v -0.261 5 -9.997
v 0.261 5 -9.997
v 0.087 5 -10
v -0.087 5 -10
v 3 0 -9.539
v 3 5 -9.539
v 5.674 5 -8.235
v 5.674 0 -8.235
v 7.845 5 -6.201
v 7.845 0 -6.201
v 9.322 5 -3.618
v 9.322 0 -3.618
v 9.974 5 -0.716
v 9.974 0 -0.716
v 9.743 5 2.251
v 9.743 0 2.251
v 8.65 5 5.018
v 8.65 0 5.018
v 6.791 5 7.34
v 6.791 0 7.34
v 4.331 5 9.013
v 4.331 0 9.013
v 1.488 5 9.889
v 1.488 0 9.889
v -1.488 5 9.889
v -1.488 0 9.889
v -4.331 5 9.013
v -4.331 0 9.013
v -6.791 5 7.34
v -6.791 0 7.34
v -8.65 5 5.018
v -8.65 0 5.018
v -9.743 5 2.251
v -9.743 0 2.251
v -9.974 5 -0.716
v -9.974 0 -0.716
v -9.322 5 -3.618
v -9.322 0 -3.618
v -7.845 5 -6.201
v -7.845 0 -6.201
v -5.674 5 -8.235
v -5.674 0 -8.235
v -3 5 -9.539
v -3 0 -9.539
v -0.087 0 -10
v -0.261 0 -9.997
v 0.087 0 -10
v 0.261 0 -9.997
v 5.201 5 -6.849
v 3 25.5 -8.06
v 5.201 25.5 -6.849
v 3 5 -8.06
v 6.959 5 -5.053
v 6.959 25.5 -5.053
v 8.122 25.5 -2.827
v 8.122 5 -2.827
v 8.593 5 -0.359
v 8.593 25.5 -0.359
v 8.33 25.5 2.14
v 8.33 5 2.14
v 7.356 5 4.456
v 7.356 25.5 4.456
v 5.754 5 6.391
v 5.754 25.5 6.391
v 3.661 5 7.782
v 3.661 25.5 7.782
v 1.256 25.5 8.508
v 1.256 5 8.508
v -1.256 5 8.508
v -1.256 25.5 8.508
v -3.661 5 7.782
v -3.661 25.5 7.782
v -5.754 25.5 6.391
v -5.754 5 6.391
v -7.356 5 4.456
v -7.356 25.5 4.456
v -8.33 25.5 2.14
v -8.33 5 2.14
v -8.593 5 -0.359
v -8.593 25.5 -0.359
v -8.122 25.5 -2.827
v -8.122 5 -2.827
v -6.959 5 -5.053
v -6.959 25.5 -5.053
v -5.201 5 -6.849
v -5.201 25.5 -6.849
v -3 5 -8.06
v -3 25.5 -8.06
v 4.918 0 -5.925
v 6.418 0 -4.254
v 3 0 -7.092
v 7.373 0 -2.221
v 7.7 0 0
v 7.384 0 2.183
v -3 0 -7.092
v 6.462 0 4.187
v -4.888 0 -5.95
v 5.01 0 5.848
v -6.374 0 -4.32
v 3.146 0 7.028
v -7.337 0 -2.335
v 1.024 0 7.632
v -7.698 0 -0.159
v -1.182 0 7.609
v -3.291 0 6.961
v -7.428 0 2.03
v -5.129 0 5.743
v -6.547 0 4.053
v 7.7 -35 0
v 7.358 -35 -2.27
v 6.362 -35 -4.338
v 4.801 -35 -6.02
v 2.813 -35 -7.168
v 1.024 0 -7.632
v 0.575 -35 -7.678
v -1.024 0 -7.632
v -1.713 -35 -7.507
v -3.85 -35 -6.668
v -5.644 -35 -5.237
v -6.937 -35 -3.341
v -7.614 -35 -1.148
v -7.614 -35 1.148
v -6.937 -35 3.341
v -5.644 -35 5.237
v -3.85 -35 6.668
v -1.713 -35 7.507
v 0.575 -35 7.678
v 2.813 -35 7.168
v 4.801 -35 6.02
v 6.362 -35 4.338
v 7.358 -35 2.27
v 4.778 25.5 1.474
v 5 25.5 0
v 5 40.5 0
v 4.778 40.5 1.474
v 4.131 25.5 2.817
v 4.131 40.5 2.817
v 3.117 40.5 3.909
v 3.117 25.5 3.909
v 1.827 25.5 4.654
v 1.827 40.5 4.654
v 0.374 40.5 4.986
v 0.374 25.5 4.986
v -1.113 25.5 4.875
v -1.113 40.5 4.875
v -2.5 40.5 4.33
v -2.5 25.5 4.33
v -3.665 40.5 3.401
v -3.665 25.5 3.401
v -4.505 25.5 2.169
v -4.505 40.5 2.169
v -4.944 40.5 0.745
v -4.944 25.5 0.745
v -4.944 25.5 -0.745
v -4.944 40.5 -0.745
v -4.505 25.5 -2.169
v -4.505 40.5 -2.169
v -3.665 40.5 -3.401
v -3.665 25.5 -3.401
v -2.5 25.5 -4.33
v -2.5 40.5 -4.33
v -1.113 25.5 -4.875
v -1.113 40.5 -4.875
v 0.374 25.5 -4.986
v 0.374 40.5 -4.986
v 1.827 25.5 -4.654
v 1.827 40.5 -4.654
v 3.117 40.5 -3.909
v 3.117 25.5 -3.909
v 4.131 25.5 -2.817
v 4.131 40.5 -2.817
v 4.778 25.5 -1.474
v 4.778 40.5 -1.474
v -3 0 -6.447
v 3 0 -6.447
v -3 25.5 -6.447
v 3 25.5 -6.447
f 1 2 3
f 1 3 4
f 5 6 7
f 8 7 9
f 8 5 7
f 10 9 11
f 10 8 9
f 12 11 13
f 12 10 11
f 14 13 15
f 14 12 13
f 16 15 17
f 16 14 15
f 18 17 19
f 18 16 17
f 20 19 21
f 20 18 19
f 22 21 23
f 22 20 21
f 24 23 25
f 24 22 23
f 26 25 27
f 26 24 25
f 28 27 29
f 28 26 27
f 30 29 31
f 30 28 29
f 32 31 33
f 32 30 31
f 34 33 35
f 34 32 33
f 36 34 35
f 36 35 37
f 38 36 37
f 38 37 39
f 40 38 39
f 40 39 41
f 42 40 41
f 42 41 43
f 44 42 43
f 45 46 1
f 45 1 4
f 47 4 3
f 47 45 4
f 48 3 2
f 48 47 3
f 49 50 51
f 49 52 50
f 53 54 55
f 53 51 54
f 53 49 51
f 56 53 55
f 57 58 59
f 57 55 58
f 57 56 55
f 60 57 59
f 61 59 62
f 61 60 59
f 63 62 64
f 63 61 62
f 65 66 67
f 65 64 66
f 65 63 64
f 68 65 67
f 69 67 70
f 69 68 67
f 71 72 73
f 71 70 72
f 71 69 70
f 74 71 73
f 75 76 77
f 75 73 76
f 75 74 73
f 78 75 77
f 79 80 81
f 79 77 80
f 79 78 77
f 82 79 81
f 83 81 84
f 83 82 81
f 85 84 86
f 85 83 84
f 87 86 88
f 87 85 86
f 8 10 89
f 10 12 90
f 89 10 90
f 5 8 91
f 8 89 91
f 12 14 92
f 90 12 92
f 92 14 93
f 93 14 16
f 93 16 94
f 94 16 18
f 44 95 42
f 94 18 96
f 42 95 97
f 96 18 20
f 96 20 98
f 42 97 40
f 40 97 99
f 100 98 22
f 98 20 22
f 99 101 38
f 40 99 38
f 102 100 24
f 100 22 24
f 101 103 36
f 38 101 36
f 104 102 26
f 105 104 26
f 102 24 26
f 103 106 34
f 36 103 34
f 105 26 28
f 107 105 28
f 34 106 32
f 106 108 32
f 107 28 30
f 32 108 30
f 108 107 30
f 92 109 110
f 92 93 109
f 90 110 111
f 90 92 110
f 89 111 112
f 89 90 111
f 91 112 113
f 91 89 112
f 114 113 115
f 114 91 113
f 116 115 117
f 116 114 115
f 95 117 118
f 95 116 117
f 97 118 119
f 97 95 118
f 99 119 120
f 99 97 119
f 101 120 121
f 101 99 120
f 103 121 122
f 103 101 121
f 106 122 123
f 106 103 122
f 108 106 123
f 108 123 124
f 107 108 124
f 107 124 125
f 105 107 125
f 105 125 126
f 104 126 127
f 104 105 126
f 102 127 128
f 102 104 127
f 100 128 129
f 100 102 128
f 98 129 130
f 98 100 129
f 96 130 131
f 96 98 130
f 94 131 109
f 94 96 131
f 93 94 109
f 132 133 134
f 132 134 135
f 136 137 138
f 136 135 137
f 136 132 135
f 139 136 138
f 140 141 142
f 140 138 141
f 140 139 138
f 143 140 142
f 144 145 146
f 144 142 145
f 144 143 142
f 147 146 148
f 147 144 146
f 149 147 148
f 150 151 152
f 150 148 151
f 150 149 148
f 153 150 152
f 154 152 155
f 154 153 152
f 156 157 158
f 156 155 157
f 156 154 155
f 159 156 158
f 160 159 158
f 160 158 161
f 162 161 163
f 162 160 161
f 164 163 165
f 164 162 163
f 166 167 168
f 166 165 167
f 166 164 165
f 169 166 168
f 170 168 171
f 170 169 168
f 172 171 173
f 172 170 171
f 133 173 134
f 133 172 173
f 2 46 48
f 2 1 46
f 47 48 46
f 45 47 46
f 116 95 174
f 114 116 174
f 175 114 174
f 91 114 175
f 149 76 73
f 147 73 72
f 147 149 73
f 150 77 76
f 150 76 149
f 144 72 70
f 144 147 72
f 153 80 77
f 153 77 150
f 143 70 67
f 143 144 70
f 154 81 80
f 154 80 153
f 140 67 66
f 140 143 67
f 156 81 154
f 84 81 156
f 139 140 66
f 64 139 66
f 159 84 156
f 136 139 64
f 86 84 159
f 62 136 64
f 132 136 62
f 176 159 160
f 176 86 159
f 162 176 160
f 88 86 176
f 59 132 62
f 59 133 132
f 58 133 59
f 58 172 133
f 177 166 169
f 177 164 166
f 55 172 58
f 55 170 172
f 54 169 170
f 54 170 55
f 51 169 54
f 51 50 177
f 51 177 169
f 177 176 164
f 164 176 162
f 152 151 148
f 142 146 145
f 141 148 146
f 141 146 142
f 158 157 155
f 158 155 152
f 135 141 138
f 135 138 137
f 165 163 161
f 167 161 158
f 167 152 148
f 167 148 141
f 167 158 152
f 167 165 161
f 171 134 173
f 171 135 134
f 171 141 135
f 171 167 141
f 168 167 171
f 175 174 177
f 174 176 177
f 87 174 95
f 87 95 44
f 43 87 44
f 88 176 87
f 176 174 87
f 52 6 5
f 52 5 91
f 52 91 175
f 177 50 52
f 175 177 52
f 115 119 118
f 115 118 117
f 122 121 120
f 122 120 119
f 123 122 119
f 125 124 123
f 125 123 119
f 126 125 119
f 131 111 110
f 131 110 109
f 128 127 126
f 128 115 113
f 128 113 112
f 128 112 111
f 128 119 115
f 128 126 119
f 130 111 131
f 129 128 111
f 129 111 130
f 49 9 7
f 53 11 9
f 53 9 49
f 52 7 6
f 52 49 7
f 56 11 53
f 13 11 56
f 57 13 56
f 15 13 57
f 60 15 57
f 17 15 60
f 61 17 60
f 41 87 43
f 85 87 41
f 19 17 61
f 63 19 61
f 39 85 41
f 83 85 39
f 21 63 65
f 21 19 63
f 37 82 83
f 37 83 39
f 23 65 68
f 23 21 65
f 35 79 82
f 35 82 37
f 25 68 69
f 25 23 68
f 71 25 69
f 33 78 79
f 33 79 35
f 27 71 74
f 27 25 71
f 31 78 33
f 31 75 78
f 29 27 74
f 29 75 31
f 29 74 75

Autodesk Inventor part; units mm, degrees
ref_plane "YZ Plane" through (0, 0, 0) normal (1, 0, 0) x (0, 1, 0)
ref_plane "XZ Plane" through (0, 0, 0) normal (0, 1, 0) x (-1, 0, 0)
ref_plane "XY Plane" through (0, 0, 0) normal (0, 0, 1) x (1, 0, 0)
sketch "Sketch1" plane through (0, 0, 0) normal (0, 1, 0) x (-1, 0, 0)
  point P0 (0, 0)
sketch "Sketch2" plane through (0, 0, 0) normal (0, 1, 0) x (-1, 0, 0)
  circle A0 centre (0, 0) radius 10
  dimension "d0" = 20
extrude "Extrusion1" add sketch "Sketch2" along normal blind 5
sketch "Sketch3" plane through (0, 5, 0) normal (0, 1, 0) x (1, 0, 0)
  circle A0 centre (0, 0) radius 10 projected
  circle A1 centre (0, 0) radius 8.6
  dimension "d3" = 17.2
extrude "Extrusion2" add sketch "Sketch3" along normal blind 20.5 contours A1
sketch "Sketch4" plane through (0, 25.5, 0) normal (0, 1, 0) x (1, 0, 0)
  circle A0 centre (0, 0) radius 8.6 projected
  circle A1 centre (0, 0) radius 5
  dimension "d6" = 10
extrude "Extrusion3" add sketch "Sketch4" along normal blind 15 contours A1
sketch "Sketch5" plane through (0, 0, 0) normal (0, -1, 0) x (1, 0, 0)
  circle A0 centre (0, 0) radius 10 projected
  circle A1 centre (0, 0) radius 7.7
  dimension "d9" = 15.4
extrude "Extrusion4" add sketch "Sketch5" along normal blind 35 contours A1
sketch "Sketch6" plane through (0, 25.5, 0) normal (0, 1, 0) x (1, 0, 0)
  line L0 (0, 9.9966) -> (0, 6.4466)
  line L1 (0, 6.4466) -> (3, 6.4466)
  line L2 (3, 6.4466) -> (-3, 6.4466)
  line L3 (-3, 6.4466) -> (-3, 9.9966)
  line L4 (-3, 9.9966) -> (3, 9.9966)
  line L5 (3, 9.9966) -> (3, 6.4466)
  dimension "d13" = 3.55
  dimension "d14" = 3
  dimension "d15" = 6
  dimension "d16" = 3.55
sketch "Sketch7" plane through (0, 40.5, 0) normal (0, 1, 0) x (1, 0, 0)
  circle A0 centre (0, 0) radius 5 projected
extrude "Extrusion5" cut sketch "Sketch6" against normal blind 25.5
properties part number "driving_shaft" material "Glass, Clear Glazing"
